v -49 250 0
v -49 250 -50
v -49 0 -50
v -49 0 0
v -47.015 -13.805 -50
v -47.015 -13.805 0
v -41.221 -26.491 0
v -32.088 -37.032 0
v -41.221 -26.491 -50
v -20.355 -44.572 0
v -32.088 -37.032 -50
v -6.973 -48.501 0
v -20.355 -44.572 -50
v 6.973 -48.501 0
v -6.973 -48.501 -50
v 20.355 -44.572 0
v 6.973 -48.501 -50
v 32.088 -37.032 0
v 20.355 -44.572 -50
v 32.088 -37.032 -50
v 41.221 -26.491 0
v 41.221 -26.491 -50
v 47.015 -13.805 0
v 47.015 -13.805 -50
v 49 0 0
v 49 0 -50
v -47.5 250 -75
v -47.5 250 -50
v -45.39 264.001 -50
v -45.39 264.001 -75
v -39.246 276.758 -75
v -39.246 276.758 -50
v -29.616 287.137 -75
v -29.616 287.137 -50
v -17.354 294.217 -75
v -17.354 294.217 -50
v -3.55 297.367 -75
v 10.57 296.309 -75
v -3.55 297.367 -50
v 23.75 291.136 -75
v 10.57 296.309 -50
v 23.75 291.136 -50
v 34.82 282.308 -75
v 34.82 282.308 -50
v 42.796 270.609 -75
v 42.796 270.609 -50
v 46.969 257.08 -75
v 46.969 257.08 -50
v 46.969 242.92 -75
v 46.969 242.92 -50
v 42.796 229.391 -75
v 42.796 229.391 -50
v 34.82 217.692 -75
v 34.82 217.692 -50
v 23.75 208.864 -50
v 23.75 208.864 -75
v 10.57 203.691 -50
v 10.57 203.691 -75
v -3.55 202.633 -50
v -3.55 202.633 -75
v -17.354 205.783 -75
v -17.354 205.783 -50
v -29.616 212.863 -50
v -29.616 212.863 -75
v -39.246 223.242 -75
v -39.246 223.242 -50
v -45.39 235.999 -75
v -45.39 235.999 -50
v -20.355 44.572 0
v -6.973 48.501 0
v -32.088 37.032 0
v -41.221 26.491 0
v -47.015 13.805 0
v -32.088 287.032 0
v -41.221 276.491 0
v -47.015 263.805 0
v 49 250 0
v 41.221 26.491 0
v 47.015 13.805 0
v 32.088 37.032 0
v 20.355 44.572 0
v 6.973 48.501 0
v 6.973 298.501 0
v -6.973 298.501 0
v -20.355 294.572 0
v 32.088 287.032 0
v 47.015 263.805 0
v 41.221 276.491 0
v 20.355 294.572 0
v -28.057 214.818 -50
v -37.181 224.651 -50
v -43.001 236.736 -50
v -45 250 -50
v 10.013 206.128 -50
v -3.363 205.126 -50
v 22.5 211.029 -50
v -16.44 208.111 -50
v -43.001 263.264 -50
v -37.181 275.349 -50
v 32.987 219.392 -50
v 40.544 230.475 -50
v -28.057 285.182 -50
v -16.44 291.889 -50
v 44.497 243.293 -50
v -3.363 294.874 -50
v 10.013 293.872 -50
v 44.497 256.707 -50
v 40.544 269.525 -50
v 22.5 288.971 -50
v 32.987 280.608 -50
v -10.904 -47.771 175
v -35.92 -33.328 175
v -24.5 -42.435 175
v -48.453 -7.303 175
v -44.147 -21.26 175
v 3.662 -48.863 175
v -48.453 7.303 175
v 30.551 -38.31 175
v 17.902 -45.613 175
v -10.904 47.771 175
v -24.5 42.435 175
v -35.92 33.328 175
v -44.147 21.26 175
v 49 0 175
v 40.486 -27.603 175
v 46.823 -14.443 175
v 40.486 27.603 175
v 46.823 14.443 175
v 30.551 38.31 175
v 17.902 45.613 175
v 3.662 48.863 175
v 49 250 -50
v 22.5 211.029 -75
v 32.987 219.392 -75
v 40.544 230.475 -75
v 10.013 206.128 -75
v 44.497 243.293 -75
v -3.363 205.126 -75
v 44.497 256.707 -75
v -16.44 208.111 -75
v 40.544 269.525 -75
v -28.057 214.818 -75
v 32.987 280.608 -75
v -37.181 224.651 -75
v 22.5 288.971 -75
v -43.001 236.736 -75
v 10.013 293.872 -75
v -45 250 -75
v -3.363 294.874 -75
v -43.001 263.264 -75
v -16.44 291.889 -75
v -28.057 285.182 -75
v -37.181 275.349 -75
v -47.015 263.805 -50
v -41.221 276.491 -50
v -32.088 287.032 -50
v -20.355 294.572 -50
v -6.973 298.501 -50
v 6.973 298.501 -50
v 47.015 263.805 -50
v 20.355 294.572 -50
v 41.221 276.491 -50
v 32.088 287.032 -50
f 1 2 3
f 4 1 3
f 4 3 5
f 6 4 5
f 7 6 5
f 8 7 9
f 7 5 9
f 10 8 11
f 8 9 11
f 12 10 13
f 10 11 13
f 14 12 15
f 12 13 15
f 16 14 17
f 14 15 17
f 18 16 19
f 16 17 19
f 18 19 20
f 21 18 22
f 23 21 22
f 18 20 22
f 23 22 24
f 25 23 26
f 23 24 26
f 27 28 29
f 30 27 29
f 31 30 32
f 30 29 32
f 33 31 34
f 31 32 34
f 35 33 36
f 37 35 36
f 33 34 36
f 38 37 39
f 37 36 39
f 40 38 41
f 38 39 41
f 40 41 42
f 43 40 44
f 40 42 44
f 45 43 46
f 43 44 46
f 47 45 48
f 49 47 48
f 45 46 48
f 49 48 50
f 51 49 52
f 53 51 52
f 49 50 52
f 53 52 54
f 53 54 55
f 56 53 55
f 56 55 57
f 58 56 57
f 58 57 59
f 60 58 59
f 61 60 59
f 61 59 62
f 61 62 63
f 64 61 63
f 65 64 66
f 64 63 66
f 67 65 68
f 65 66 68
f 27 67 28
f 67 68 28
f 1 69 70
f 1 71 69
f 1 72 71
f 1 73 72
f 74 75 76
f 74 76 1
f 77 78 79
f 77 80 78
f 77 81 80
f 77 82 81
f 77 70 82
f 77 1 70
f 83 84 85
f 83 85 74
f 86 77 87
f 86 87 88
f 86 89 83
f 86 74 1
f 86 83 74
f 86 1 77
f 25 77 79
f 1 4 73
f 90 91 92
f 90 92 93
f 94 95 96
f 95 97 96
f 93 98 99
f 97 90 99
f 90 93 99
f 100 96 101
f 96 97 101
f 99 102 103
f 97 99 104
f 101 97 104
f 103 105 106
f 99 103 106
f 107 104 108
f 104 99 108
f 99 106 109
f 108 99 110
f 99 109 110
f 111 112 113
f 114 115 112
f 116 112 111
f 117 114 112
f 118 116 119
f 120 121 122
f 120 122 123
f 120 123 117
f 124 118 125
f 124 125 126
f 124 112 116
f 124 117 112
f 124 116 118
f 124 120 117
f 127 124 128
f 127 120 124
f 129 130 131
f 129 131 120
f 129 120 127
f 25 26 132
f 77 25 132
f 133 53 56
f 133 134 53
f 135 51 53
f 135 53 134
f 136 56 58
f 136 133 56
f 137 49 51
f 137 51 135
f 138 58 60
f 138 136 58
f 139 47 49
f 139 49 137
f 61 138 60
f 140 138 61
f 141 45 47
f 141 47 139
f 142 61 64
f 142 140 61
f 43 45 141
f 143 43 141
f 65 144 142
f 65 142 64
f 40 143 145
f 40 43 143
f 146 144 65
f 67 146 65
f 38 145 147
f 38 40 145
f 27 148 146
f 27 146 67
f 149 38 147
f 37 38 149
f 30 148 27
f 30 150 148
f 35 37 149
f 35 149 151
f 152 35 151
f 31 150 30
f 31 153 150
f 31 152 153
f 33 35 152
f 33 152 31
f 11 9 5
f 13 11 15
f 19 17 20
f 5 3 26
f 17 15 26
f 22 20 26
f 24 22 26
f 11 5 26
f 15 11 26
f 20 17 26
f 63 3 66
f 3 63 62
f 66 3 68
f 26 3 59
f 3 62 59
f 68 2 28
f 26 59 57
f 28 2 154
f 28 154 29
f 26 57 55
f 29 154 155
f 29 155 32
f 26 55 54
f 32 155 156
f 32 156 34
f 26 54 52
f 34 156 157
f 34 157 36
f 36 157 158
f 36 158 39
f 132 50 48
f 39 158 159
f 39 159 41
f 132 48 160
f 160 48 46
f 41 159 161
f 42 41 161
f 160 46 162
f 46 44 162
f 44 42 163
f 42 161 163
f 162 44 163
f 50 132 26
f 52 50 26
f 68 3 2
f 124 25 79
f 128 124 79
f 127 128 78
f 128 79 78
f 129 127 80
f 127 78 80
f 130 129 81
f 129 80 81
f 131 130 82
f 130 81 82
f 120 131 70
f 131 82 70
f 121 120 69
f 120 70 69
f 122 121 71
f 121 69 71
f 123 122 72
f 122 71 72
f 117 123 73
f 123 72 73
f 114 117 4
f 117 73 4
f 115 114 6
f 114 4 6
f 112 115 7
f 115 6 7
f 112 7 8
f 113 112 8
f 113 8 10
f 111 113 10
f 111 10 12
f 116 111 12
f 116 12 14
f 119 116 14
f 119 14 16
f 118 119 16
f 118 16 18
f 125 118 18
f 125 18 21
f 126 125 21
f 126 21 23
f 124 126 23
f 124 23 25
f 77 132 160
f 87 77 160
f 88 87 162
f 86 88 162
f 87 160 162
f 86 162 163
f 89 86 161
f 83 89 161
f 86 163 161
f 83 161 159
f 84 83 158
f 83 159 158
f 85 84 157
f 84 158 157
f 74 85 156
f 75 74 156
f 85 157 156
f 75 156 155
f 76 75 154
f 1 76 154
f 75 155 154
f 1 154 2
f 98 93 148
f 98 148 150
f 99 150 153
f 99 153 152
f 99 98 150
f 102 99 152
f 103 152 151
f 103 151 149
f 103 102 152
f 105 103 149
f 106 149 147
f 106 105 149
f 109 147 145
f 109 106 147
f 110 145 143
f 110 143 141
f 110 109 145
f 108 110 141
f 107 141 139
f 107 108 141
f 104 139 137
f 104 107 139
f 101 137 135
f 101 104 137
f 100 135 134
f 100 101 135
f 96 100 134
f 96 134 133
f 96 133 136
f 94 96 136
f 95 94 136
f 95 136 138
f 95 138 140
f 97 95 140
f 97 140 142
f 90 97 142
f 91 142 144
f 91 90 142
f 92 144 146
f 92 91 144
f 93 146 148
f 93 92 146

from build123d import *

# Parameters (mm, degrees)
SKETCH1_R           = 49
BOSS_EXTRUDE1_DEPTH = 175
BOSS_EXTRUDE2_START = 50
BOSS_EXTRUDE2_DEPTH = 50
SKETCH3_R           = 47.5
SKETCH3_R_2         = 45
BOSS_EXTRUDE3_DEPTH = 25


with BuildPart() as part:
    # Sketch1 → Boss-Extrude1 (new body)
    with BuildSketch(Plane.XY):
        Circle(SKETCH1_R)
    extrude(amount=BOSS_EXTRUDE1_DEPTH)

    # Sketch2 → Boss-Extrude2 (add)
    with BuildSketch(Plane(origin=(0, 0, 0), x_dir=(-1, 0, 0), z_dir=(0, 0, -1)).offset(BOSS_EXTRUDE2_START)):
        with BuildLine():
            Line((-49, 0), (-49, 250))
            ThreePointArc((-49, 250), (0, 299), (49, 250))
            Line((49, 250), (49, 0))
            ThreePointArc((49, 0), (0, -49), (-49, 0))
        make_face()
    extrude(amount=-BOSS_EXTRUDE2_DEPTH)

    # Sketch3 → Boss-Extrude3 (add)
    with BuildSketch(Plane(origin=(0, 0, -50), x_dir=(-1, 0, 0), z_dir=(0, 0, -1))):
        with Locations((0, 250)):
            Circle(SKETCH3_R)
        with Locations((0, 250)):
            Circle(SKETCH3_R_2, mode=Mode.SUBTRACT)
    extrude(amount=BOSS_EXTRUDE3_DEPTH)


solid = part.part
